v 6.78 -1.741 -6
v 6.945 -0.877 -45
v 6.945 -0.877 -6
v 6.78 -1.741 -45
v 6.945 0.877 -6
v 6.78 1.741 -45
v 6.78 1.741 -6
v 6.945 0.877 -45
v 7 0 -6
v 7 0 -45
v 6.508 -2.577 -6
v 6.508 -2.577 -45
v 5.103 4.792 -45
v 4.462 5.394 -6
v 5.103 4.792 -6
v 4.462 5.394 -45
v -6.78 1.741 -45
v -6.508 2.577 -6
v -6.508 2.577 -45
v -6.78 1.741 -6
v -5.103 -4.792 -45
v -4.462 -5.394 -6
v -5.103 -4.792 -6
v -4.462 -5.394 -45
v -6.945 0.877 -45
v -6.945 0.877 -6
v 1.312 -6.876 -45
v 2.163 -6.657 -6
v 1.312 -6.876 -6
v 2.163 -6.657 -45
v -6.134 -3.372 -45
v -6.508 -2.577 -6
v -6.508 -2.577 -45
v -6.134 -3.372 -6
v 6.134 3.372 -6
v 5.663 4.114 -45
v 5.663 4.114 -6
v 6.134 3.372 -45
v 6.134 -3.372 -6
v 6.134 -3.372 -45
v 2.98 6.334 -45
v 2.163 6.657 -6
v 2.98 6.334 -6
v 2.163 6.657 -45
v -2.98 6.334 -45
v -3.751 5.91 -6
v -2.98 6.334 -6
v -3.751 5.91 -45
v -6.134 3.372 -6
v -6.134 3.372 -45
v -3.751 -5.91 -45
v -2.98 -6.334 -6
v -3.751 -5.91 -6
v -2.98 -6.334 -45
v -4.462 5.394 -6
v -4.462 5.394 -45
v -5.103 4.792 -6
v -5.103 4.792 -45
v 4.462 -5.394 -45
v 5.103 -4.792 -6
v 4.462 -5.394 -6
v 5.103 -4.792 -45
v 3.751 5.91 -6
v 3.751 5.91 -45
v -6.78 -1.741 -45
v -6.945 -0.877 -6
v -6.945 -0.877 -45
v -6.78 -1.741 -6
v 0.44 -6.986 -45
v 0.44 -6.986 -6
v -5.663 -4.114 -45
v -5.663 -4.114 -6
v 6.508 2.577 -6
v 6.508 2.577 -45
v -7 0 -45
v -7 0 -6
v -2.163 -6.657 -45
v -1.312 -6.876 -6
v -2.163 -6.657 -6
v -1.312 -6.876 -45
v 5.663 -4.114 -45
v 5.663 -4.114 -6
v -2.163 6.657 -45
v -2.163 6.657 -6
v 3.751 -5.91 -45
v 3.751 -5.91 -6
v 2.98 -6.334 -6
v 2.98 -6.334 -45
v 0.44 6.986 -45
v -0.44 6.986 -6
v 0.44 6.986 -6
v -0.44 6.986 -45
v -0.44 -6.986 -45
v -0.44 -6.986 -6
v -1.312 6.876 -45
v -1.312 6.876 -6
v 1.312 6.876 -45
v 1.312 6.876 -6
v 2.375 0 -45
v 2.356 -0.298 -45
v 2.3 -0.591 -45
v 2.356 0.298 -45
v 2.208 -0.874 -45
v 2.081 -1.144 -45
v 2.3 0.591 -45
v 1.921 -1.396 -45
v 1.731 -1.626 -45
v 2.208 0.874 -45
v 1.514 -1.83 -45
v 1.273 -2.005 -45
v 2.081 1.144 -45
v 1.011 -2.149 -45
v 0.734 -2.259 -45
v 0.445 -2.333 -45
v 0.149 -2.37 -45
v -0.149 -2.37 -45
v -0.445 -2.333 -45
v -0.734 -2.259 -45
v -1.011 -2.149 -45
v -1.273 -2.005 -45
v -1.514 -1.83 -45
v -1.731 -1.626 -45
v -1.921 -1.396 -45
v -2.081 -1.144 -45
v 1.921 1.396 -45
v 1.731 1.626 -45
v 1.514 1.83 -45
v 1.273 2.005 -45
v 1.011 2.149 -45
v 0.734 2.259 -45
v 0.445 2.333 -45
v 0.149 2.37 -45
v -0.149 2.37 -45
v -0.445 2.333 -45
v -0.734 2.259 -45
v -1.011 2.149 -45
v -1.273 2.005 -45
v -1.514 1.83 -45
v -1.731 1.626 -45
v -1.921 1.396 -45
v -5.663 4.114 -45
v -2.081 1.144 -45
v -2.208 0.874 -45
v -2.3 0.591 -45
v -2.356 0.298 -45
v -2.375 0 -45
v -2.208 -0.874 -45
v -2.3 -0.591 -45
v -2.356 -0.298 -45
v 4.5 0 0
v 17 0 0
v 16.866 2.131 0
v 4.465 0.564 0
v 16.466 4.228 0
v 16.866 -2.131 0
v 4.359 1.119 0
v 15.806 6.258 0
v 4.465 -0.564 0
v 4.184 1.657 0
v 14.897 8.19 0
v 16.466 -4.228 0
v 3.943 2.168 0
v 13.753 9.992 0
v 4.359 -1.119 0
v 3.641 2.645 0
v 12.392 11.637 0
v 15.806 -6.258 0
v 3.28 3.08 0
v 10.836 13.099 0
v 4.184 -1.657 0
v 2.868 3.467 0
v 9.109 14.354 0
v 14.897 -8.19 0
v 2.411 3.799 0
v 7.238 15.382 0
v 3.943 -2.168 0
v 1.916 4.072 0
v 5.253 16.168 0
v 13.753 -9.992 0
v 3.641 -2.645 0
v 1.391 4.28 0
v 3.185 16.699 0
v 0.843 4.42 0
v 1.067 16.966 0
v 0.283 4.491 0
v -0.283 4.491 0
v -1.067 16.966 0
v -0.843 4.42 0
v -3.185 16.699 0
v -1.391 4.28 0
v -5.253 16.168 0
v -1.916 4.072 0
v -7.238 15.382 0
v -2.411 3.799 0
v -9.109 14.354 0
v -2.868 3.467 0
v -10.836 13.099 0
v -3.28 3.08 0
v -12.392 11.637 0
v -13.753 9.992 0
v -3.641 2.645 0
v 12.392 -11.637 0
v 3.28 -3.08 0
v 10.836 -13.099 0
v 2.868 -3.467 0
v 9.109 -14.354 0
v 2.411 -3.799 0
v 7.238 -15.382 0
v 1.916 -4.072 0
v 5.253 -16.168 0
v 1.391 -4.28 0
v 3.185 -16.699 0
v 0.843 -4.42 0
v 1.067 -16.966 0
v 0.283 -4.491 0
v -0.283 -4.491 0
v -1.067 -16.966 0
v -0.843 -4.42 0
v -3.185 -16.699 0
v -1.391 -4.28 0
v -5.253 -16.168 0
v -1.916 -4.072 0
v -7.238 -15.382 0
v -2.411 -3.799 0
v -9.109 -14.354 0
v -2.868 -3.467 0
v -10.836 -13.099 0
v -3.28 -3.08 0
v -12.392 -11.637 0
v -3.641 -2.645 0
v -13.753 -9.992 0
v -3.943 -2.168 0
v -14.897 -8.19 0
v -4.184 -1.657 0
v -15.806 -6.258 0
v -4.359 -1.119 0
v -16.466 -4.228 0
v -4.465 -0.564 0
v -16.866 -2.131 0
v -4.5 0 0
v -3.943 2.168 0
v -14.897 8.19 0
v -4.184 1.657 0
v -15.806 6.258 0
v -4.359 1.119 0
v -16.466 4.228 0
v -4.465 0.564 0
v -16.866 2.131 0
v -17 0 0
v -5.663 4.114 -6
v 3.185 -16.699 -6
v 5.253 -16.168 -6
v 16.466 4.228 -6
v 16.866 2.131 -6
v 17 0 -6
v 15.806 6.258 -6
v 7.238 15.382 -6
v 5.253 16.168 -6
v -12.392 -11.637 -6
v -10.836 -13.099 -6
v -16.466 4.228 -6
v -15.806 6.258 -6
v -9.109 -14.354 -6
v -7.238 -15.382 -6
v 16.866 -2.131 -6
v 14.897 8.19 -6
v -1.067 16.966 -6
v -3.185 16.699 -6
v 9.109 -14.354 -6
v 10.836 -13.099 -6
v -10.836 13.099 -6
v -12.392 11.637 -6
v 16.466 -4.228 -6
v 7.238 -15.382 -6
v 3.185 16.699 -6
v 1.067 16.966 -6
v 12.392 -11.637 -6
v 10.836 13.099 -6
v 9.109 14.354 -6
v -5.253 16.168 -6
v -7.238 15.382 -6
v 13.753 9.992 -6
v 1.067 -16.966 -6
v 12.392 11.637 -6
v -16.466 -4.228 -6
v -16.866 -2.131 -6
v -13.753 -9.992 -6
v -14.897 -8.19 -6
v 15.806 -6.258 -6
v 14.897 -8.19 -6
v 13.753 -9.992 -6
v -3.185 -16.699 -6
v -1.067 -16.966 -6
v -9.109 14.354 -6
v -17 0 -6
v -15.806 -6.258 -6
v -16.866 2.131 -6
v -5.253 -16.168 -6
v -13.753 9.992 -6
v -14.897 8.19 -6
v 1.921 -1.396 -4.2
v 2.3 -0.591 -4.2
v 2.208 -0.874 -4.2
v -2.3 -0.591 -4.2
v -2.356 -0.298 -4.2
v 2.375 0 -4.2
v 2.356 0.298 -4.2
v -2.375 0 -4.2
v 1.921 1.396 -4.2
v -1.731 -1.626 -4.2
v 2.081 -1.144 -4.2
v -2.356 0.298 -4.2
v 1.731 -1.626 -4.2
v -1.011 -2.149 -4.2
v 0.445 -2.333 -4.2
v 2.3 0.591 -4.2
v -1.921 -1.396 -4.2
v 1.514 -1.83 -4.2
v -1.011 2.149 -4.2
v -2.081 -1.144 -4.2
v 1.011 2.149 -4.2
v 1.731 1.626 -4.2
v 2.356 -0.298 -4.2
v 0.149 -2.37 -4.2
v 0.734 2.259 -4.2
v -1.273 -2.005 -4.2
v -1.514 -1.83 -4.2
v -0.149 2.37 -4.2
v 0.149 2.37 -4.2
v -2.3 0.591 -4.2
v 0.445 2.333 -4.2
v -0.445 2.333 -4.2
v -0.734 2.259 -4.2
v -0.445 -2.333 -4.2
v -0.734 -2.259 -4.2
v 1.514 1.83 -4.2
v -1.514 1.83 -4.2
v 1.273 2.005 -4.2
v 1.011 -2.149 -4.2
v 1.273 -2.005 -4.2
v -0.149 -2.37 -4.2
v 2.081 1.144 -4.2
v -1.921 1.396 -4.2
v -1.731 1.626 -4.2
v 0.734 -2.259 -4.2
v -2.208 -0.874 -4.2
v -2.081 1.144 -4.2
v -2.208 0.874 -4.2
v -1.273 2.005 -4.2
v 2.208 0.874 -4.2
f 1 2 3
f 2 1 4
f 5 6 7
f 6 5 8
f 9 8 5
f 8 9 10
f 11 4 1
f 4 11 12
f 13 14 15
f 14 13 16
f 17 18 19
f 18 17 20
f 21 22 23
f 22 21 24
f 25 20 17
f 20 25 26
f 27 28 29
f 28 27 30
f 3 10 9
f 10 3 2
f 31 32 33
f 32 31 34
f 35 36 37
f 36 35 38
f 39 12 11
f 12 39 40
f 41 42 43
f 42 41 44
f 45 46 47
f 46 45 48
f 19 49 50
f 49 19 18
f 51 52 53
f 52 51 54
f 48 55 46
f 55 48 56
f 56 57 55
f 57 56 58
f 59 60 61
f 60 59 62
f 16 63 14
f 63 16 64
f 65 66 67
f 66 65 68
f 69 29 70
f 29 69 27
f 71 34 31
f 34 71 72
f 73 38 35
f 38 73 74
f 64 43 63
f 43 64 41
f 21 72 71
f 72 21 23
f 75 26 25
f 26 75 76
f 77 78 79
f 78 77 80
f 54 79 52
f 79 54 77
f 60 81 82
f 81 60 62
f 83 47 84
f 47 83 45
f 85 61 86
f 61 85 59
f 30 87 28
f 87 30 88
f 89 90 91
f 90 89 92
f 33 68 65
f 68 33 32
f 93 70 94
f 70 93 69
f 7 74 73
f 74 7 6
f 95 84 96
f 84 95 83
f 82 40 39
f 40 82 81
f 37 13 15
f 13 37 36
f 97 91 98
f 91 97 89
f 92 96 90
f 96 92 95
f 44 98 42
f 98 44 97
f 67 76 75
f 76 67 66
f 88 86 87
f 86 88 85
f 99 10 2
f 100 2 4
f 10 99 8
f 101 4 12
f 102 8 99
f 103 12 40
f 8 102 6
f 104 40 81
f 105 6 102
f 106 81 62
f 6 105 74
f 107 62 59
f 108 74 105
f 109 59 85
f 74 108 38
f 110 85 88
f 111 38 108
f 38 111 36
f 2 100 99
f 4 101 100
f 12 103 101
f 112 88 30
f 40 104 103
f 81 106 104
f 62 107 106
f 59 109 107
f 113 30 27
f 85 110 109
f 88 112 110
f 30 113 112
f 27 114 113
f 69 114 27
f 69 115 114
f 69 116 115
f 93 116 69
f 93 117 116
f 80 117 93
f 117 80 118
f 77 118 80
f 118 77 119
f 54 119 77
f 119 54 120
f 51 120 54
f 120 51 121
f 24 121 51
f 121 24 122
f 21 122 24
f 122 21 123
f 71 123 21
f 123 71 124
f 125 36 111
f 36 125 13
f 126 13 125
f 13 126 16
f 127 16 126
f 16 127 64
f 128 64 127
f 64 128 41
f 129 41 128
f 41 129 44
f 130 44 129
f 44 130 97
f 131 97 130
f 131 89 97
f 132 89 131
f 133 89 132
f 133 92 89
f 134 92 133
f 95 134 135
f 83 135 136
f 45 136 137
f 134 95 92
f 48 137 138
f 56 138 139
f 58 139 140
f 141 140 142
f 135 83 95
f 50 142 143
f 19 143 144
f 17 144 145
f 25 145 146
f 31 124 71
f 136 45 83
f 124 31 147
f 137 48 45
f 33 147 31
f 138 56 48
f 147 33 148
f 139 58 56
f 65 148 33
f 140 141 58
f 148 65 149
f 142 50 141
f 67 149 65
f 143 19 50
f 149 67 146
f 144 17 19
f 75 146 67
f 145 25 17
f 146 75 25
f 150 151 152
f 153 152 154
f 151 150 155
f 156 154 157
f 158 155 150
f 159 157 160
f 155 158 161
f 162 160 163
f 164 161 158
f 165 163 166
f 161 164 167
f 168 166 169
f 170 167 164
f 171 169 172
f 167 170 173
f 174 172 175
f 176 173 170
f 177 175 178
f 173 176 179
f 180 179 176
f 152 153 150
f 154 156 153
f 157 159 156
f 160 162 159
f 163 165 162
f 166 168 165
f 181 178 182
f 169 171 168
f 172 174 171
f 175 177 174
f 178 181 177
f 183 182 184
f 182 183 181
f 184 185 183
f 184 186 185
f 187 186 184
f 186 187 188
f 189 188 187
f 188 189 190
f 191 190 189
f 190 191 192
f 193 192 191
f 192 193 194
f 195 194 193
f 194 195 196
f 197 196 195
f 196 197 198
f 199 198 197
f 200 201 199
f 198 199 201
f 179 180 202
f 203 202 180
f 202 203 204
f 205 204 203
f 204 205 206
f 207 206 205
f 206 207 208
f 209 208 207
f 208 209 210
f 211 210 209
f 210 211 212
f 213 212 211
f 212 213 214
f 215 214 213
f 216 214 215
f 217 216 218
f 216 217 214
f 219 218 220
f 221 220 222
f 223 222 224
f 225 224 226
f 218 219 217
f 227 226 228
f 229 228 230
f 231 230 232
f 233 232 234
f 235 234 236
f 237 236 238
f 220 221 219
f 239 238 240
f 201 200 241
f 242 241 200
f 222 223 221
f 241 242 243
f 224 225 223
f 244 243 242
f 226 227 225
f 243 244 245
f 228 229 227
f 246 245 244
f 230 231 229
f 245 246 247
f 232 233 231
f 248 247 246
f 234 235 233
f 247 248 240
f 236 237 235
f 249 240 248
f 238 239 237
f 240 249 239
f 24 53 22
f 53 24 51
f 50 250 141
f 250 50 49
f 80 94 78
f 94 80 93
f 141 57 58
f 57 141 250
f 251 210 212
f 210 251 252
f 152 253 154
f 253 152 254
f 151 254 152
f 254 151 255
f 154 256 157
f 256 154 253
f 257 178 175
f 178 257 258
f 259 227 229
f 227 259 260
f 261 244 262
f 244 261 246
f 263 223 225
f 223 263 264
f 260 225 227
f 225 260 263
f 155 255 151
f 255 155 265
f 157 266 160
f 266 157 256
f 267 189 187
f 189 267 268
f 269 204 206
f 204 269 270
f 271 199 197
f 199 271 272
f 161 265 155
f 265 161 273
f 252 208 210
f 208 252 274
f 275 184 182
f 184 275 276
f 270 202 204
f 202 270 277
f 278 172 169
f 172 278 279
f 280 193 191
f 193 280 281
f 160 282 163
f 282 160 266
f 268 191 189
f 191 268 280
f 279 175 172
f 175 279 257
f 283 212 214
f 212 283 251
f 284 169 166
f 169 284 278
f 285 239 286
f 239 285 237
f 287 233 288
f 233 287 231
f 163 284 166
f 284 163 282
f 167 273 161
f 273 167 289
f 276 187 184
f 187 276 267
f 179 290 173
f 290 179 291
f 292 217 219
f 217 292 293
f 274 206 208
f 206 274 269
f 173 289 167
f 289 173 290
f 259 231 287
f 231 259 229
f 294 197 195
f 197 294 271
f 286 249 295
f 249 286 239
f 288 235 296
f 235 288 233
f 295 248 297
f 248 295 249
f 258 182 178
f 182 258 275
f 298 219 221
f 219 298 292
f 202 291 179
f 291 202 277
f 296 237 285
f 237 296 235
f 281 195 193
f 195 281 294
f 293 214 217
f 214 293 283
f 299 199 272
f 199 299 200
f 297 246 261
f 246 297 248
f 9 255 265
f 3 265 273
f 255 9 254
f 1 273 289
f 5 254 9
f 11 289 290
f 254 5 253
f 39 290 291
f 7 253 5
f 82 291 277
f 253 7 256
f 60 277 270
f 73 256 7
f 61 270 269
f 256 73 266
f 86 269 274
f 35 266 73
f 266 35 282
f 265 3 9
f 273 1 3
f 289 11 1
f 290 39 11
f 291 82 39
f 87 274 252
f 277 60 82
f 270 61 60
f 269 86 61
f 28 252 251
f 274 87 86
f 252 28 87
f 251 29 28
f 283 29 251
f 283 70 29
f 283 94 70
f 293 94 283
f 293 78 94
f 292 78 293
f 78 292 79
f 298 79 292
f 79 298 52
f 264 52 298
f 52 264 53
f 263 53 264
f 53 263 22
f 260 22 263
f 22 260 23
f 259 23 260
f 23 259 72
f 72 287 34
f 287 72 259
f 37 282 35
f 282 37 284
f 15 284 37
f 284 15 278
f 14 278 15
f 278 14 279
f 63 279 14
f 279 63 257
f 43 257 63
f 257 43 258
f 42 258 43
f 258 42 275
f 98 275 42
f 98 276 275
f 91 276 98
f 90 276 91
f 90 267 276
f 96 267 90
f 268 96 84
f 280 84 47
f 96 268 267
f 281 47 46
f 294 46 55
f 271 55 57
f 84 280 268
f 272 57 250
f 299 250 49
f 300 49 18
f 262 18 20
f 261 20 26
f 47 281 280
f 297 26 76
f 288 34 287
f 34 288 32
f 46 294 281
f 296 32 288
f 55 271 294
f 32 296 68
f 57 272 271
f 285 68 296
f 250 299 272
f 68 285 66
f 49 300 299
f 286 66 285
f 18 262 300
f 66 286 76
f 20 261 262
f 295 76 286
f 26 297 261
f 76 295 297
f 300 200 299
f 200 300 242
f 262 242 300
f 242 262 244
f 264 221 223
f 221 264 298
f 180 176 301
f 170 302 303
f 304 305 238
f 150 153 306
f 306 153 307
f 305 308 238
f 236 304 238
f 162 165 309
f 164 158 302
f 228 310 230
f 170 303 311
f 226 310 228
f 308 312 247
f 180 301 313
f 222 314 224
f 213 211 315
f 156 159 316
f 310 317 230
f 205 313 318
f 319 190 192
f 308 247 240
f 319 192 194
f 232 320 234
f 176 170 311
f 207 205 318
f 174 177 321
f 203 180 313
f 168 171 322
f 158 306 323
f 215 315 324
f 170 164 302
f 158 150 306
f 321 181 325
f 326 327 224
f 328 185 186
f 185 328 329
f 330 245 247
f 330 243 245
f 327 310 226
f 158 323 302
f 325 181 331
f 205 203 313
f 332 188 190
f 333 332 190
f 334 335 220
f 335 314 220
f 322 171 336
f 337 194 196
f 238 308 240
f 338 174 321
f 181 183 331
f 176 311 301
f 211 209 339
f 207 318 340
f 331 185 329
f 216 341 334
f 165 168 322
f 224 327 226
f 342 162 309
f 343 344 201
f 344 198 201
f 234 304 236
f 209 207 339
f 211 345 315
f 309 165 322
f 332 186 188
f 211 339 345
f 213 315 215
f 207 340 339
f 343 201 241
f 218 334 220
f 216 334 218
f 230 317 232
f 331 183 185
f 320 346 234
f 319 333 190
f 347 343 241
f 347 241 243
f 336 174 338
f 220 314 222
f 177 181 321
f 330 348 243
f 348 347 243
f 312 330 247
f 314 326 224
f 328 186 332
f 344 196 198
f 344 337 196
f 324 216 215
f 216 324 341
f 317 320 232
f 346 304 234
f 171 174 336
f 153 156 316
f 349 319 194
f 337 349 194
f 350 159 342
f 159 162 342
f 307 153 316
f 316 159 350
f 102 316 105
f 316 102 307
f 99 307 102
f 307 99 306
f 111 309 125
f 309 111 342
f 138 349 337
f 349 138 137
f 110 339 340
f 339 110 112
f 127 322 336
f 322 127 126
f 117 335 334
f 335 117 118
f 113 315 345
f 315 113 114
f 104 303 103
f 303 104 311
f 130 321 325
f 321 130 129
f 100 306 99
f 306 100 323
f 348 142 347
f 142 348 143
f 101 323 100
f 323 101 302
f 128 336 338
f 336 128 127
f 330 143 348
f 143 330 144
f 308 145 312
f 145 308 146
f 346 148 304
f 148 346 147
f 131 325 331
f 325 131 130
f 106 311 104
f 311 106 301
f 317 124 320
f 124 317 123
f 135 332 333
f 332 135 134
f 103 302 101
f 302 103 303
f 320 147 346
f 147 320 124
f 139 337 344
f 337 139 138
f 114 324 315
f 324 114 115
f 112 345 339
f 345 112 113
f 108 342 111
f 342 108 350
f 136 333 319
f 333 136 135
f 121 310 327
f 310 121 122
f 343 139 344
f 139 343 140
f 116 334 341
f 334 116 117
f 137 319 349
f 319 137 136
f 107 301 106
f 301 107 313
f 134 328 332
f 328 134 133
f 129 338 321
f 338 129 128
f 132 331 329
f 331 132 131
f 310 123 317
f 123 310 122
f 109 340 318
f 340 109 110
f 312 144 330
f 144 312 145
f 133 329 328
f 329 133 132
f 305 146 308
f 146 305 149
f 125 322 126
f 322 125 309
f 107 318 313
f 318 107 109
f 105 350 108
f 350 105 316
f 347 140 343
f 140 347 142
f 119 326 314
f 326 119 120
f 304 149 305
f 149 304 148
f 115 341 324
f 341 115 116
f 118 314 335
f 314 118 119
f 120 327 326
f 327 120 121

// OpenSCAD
$fn = 50;


difference() {
	union() {
		translate(v = [0, 0, -45.0000000000]) {
			cylinder(h = 45, r = 7.0000000000);
		}
		translate(v = [0, 0, -6.0000000000]) {
			cylinder(h = 6, r = 17.0000000000);
		}
	}
	union() {
		translate(v = [0, 0, 0]) {
			rotate(a = [0, 0, 0]) {
				difference() {
					union() {
						#translate(v = [0, 0, -45.0000000000]) {
							cylinder(h = 45, r = 2.2500000000);
						}
						#translate(v = [0, 0, -4.2000000000]) {
							cylinder(h = 4.2000000000, r1 = 2.3750000000, r2 = 4.5000000000);
						}
						#translate(v = [0, 0, -45.0000000000]) {
							cylinder(h = 45, r = 2.3750000000);
						}
						#translate(v = [0, 0, -45.0000000000]) {
							cylinder(h = 45, r = 2.2500000000);
						}
					}
					union();
				}
			}
		}
	}
}
